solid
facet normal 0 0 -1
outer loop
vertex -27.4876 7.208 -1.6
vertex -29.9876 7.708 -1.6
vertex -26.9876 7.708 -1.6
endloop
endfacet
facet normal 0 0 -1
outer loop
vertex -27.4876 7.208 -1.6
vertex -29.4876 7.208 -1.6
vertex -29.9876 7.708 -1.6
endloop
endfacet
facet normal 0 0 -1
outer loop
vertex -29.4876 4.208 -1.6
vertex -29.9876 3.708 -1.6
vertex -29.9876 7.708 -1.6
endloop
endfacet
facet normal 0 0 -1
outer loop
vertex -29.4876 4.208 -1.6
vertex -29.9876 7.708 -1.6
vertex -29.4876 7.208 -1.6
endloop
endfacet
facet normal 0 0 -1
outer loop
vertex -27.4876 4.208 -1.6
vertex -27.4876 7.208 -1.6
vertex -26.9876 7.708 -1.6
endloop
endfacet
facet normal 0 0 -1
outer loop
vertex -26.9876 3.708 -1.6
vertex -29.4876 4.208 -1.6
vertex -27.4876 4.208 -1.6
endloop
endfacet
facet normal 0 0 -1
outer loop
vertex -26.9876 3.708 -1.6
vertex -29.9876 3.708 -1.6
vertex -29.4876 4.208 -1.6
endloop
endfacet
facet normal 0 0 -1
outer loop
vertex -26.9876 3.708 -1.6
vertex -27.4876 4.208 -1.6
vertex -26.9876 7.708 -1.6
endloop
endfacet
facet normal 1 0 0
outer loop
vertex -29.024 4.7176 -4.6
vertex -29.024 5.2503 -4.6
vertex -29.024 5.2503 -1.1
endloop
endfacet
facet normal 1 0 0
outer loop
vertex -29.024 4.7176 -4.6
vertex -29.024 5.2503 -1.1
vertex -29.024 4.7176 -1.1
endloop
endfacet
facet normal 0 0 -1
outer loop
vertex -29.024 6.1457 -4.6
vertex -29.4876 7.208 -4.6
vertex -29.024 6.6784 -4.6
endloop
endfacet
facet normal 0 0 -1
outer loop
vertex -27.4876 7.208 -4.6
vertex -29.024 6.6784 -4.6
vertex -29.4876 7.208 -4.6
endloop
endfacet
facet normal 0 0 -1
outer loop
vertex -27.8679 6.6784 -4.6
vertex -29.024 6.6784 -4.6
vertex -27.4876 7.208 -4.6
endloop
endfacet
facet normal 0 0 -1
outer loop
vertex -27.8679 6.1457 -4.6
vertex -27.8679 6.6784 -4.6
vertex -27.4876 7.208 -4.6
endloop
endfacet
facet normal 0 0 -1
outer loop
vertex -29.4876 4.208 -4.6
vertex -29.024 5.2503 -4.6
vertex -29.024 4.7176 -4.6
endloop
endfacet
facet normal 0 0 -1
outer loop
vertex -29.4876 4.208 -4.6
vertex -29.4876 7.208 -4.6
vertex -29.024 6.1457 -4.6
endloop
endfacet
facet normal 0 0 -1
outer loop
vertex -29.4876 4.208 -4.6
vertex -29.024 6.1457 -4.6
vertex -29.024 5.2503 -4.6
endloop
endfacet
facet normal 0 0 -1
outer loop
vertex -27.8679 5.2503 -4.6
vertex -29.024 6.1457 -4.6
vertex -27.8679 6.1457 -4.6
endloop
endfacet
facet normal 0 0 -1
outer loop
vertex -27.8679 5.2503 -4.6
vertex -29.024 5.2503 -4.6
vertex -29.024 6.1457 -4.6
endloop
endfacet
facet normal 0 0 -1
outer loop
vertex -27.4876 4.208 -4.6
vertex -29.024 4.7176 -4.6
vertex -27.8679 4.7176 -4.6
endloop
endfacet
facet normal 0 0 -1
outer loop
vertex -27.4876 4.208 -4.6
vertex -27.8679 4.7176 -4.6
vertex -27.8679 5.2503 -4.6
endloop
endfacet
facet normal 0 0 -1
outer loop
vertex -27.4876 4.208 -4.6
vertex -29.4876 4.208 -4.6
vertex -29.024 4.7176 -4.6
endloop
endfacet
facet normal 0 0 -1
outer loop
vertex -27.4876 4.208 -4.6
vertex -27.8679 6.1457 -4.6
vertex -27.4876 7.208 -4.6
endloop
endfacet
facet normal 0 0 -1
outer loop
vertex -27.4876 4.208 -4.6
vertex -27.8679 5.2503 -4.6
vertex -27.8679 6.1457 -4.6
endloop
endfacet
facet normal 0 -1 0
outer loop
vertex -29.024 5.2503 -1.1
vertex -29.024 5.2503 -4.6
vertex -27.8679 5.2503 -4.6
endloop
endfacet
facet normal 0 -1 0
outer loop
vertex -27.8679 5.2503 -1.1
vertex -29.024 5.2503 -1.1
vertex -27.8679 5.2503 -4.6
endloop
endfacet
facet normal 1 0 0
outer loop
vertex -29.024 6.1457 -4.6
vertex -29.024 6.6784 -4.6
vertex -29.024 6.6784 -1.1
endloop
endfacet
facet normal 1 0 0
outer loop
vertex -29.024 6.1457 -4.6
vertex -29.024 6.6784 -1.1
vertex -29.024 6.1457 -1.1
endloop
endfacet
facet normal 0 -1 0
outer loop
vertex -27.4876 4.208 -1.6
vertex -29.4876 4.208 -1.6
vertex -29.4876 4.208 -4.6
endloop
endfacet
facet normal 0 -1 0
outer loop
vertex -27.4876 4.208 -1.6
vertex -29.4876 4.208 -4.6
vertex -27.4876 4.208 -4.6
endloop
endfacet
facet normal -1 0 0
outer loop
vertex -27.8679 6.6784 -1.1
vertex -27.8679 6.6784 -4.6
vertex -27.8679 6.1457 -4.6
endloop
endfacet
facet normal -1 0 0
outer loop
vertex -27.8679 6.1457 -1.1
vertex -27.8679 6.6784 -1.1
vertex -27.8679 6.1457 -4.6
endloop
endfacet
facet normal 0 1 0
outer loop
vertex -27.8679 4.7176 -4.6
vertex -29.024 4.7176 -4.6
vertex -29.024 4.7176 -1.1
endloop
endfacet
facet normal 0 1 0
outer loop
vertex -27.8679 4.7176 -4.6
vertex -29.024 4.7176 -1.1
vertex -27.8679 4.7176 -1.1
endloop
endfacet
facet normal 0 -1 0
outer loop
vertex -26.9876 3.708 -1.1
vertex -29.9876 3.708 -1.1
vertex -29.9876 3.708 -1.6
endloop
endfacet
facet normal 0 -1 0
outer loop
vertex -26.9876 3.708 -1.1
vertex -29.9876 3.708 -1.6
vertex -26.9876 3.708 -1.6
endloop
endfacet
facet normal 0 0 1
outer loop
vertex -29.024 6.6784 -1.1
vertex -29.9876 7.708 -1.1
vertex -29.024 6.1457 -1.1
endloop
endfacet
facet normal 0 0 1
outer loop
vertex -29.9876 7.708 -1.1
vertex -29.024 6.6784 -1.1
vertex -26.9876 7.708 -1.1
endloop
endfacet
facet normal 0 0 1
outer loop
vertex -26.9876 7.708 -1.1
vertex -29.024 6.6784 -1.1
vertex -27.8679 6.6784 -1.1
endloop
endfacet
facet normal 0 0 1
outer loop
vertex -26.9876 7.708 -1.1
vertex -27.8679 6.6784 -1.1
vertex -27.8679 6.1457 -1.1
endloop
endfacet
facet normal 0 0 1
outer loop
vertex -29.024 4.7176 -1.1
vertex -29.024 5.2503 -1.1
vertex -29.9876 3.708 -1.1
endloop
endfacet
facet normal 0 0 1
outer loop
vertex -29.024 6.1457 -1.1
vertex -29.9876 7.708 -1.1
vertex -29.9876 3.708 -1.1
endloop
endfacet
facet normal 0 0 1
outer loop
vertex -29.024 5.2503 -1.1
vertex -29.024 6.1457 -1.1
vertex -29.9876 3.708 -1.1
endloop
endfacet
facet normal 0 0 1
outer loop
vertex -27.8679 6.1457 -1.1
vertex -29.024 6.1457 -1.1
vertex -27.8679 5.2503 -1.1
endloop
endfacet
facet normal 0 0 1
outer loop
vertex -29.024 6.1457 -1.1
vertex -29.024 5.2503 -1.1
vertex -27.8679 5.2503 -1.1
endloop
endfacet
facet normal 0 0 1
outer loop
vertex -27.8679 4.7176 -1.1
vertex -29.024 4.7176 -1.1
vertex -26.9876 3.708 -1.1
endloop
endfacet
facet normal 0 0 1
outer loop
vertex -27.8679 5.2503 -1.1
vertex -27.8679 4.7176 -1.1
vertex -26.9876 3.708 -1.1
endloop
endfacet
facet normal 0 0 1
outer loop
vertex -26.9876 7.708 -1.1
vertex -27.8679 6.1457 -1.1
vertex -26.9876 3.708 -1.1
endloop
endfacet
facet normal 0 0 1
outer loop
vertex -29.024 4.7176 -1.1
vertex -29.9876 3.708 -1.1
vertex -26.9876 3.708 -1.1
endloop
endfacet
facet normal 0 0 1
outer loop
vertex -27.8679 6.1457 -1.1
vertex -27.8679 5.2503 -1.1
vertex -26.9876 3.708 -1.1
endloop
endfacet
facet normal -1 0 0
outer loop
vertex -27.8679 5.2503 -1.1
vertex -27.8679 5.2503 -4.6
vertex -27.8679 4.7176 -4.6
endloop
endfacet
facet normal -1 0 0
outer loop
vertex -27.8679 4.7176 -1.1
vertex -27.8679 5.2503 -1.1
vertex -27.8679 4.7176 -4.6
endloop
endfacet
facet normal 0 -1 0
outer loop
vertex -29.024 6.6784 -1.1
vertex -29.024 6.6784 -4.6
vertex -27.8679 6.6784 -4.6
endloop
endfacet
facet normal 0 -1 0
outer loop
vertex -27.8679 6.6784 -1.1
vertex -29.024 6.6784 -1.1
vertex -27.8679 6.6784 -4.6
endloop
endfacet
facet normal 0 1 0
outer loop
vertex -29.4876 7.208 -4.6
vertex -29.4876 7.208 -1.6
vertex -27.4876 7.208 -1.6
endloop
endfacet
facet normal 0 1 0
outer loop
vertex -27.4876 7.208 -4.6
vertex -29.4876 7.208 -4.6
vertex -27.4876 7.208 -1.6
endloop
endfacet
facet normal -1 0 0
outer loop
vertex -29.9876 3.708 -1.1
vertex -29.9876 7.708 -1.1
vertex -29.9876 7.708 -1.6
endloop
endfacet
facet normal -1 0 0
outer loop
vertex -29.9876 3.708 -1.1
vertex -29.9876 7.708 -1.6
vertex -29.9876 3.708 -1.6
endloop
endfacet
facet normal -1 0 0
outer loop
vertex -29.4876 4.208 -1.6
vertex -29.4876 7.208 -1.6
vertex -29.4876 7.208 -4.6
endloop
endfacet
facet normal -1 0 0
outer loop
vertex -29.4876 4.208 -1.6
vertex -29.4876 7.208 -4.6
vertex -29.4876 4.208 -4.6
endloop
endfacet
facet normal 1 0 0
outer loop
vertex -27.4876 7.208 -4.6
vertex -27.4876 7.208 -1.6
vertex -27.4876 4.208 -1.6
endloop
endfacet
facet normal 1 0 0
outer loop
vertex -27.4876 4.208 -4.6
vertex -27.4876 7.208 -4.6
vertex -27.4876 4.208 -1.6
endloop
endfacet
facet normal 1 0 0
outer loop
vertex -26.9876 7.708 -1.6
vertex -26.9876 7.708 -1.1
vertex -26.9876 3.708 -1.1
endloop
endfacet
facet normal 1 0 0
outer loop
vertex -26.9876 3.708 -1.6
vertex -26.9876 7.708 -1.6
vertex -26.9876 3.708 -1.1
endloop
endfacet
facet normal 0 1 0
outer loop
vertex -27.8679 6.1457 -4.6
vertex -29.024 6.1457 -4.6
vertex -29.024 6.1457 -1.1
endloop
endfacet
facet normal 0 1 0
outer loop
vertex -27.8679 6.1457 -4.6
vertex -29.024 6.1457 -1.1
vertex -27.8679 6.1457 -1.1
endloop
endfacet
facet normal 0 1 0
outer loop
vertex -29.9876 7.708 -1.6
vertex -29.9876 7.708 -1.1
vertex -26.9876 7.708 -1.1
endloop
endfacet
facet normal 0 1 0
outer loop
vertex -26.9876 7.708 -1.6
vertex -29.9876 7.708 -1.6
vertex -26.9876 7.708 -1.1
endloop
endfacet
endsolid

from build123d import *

# Parameters (mm, degrees)
SKETCH016_W     = 3
SKETCH016_H     = 4
PAD006_DEPTH    = 0.5
SKETCH017_W     = 2
SKETCH017_H     = 3
PAD007_DEPTH    = 3
SKETCH018_W     = 1.156093
SKETCH018_H     = 0.532709
POCKET002_DEPTH = 5


with BuildPart() as part:
    # Sketch016 (on ShapeBinder) → Pad006 (new body)
    with BuildSketch(Plane(origin=(0, 0, -1.1), x_dir=(1, 0, 0), z_dir=(0, 0, -1))):
        with Locations((-28.48764, -5.707956)):
            Rectangle(SKETCH016_W, SKETCH016_H)
    extrude(amount=PAD006_DEPTH)

    # Sketch017 (on Face6 of Pad006) → Pad007 (join)
    with BuildSketch(Plane(origin=(0, 0, -1.6), x_dir=(1, 0, 0), z_dir=(0, 0, -1))):
        with Locations((-28.48764, -5.707956)):
            Rectangle(SKETCH017_W, SKETCH017_H)
    extrude(amount=PAD007_DEPTH)

    # Sketch018 (on Face11 of Pad007) → Pocket002 (cut)
    with BuildSketch(Plane(origin=(0, 0, -4.6), x_dir=(1, 0, 0), z_dir=(0, 0, -1))):
        with Locations((-28.445949, -4.983932)):
            Rectangle(SKETCH018_W, SKETCH018_H)
        with Locations((-28.445949, -6.412046)):
            Rectangle(SKETCH018_W, SKETCH018_H)
    extrude(amount=-POCKET002_DEPTH, mode=Mode.SUBTRACT)


solid = part.part
